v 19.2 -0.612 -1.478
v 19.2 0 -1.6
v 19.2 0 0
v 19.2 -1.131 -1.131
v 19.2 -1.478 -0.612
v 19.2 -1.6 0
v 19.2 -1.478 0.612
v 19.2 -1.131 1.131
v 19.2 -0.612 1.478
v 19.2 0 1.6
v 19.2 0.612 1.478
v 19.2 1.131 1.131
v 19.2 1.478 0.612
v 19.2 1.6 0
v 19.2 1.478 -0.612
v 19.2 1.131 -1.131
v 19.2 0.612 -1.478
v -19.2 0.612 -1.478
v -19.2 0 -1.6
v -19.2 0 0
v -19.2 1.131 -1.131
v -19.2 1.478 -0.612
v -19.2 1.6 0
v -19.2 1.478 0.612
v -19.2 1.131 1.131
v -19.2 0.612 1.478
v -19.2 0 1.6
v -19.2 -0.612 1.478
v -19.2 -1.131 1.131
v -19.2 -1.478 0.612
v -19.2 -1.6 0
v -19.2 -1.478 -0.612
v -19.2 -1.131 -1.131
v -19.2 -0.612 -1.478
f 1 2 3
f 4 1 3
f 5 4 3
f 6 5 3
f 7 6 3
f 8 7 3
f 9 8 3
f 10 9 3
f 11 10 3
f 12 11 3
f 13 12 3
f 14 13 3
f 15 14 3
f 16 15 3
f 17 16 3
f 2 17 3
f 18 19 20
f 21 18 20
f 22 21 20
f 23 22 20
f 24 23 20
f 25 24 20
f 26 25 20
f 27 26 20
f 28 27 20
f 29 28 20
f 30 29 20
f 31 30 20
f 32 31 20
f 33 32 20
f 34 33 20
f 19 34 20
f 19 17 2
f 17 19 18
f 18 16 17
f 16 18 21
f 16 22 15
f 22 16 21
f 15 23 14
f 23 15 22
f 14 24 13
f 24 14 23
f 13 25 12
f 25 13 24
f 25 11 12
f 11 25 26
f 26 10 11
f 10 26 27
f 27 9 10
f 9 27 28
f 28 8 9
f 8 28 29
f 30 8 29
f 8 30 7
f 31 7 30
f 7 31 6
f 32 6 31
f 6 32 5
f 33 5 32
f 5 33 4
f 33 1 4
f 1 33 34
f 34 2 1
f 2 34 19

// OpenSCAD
// file: ../p/4-4edge.scad
use <../lib.scad>
function ldraw_lib__4_4edge() = [
// 0 Circle 1.0
// 0 Name: 4-4edge.dat
// 0 Author: James Jessiman
// 0 !LDRAW_ORG Primitive UPDATE 2017-01
// 0 !LICENSE Licensed under CC BY 2.0 and CC BY 4.0 : see CAreadme.txt
// 
// 0 BFC CERTIFY CCW
  [0,"BFC","CERTIFY"],
  [0,"BFC","CCW"],
// 
// 0 !HISTORY 1998-12-15 [PTadmin] Official Update 1998-10
// 0 !HISTORY 2005-12-28 [PTadmin] Official Update 2005-01
// 0 !HISTORY 2007-06-24 [PTadmin] Header formatted for Contributor Agreement
// 0 !HISTORY 2008-07-01 [PTadmin] Official Update 2008-01
// 0 !HISTORY 2017-01-15 [Steffen] BFCed
// 0 !HISTORY 2017-12-30 [PTadmin] Official Update 2017-01
// 
// 
// 2 24 1 0 0 0.9239 0 0.3827
  [2,24,1,0,0,0.9239,0,0.3827],
// 2 24 0.9239 0 0.3827 0.7071 0 0.7071
  [2,24,0.9239,0,0.3827,0.7071,0,0.7071],
// 2 24 0.7071 0 0.7071 0.3827 0 0.9239
  [2,24,0.7071,0,0.7071,0.3827,0,0.9239],
// 2 24 0.3827 0 0.9239 0 0 1
  [2,24,0.3827,0,0.9239,0,0,1],
// 2 24 0 0 1 -0.3827 0 0.9239
  [2,24,0,0,1,-0.3827,0,0.9239],
// 2 24 -0.3827 0 0.9239 -0.7071 0 0.7071
  [2,24,-0.3827,0,0.9239,-0.7071,0,0.7071],
// 2 24 -0.7071 0 0.7071 -0.9239 0 0.3827
  [2,24,-0.7071,0,0.7071,-0.9239,0,0.3827],
// 2 24 -0.9239 0 0.3827 -1 0 -0
  [2,24,-0.9239,0,0.3827,-1,0,-0],
// 2 24 -1 0 -0 -0.9239 0 -0.3827
  [2,24,-1,0,-0,-0.9239,0,-0.3827],
// 2 24 -0.9239 0 -0.3827 -0.7071 0 -0.7071
  [2,24,-0.9239,0,-0.3827,-0.7071,0,-0.7071],
// 2 24 -0.7071 0 -0.7071 -0.3827 0 -0.9239
  [2,24,-0.7071,0,-0.7071,-0.3827,0,-0.9239],
// 2 24 -0.3827 0 -0.9239 0 0 -1
  [2,24,-0.3827,0,-0.9239,0,0,-1],
// 2 24 0 0 -1 0.3827 0 -0.9239
  [2,24,0,0,-1,0.3827,0,-0.9239],
// 2 24 0.3827 0 -0.9239 0.7071 0 -0.7071
  [2,24,0.3827,0,-0.9239,0.7071,0,-0.7071],
// 2 24 0.7071 0 -0.7071 0.9239 0 -0.3827
  [2,24,0.7071,0,-0.7071,0.9239,0,-0.3827],
// 2 24 0.9239 0 -0.3827 1 0 0
  [2,24,0.9239,0,-0.3827,1,0,0],
];
module ldraw_lib__4_4edge(step=0, col=false, unit=2/5, alt=false, line=0.2, solid=!$preview)
    makepoly(ldraw_lib__4_4edge(), step=step, col=col, unit=unit, alt=alt, line=line, solid=solid);
ldraw_lib__4_4edge(line=0.2);
// file: ../p/4-4cyli.scad
use <../lib.scad>
function ldraw_lib__4_4cyli() = [
// 0 Cylinder 1.0
// 0 Name: 4-4cyli.dat
// 0 Author: James Jessiman
// 0 !LDRAW_ORG Primitive UPDATE 2005-01
// 0 !LICENSE Licensed under CC BY 2.0 and CC BY 4.0 : see CAreadme.txt
// 
// 0 BFC CERTIFY CCW
  [0,"BFC","CERTIFY"],
  [0,"BFC","CCW"],
// 
// 0 !HISTORY 1998-12-15 [PTadmin] Official Update 1998-10
// 0 !HISTORY 2002-03-23 [sbliss] Added BFC statement; merged headers from files in distributions LDraw 0.27 and Complete.
// 0 !HISTORY 2002-04-25 [PTadmin] Official Update 2002-02
// 0 !HISTORY 2004-12-14 [guyvivan] BFC CCW
// 0 !HISTORY 2005-12-28 [PTadmin] Official Update 2005-01
// 0 !HISTORY 2007-06-24 [PTadmin] Header formatted for Contributor Agreement
// 0 !HISTORY 2008-07-01 [PTadmin] Official Update 2008-01
// 
// 
// 4 16 1 1 0 0.9239 1 0.3827 0.9239 0 0.3827 1 0 0
  [4,16,1,1,0,0.9239,1,0.3827,0.9239,0,0.3827,1,0,0],
// 5 24 1 0 0 1 1 0 0.9239 0 0.3827 0.9239 0 -0.3827
  [5,24,1,0,0,1,1,0,0.9239,0,0.3827,0.9239,0,-0.3827],
// 4 16 0.9239 1 0.3827 0.7071 1 0.7071 0.7071 0 0.7071 0.9239 0 0.3827
  [4,16,0.9239,1,0.3827,0.7071,1,0.7071,0.7071,0,0.7071,0.9239,0,0.3827],
// 5 24 0.9239 0 0.3827 0.9239 1 0.3827 0.7071 0 0.7071 1 0 0
  [5,24,0.9239,0,0.3827,0.9239,1,0.3827,0.7071,0,0.7071,1,0,0],
// 4 16 0.7071 1 0.7071 0.3827 1 0.9239 0.3827 0 0.9239 0.7071 0 0.7071
  [4,16,0.7071,1,0.7071,0.3827,1,0.9239,0.3827,0,0.9239,0.7071,0,0.7071],
// 5 24 0.7071 0 0.7071 0.7071 1 0.7071 0.3827 0 0.9239 0.9239 0 0.3827
  [5,24,0.7071,0,0.7071,0.7071,1,0.7071,0.3827,0,0.9239,0.9239,0,0.3827],
// 4 16 0.3827 1 0.9239 0 1 1 0 0 1 0.3827 0 0.9239
  [4,16,0.3827,1,0.9239,0,1,1,0,0,1,0.3827,0,0.9239],
// 5 24 0.3827 0 0.9239 0.3827 1 0.9239 0 0 1 0.7071 0 0.7071
  [5,24,0.3827,0,0.9239,0.3827,1,0.9239,0,0,1,0.7071,0,0.7071],
// 4 16 0 1 1 -0.3827 1 0.9239 -0.3827 0 0.9239 0 0 1
  [4,16,0,1,1,-0.3827,1,0.9239,-0.3827,0,0.9239,0,0,1],
// 5 24 0 0 1 0 1 1 -0.3827 0 0.9239 0.3827 0 0.9239
  [5,24,0,0,1,0,1,1,-0.3827,0,0.9239,0.3827,0,0.9239],
// 4 16 -0.3827 1 0.9239 -0.7071 1 0.7071 -0.7071 0 0.7071 -0.3827 0 0.9239
  [4,16,-0.3827,1,0.9239,-0.7071,1,0.7071,-0.7071,0,0.7071,-0.3827,0,0.9239],
// 5 24 -0.3827 0 0.9239 -0.3827 1 0.9239 -0.7071 0 0.7071 0 0 1
  [5,24,-0.3827,0,0.9239,-0.3827,1,0.9239,-0.7071,0,0.7071,0,0,1],
// 4 16 -0.7071 1 0.7071 -0.9239 1 0.3827 -0.9239 0 0.3827 -0.7071 0 0.7071
  [4,16,-0.7071,1,0.7071,-0.9239,1,0.3827,-0.9239,0,0.3827,-0.7071,0,0.7071],
// 5 24 -0.7071 0 0.7071 -0.7071 1 0.7071 -0.9239 0 0.3827 -0.3827 0 0.9239
  [5,24,-0.7071,0,0.7071,-0.7071,1,0.7071,-0.9239,0,0.3827,-0.3827,0,0.9239],
// 4 16 -0.9239 1 0.3827 -1 1 0 -1 0 0 -0.9239 0 0.3827
  [4,16,-0.9239,1,0.3827,-1,1,0,-1,0,0,-0.9239,0,0.3827],
// 5 24 -0.9239 0 0.3827 -0.9239 1 0.3827 -1 0 0 -0.7071 0 0.7071
  [5,24,-0.9239,0,0.3827,-0.9239,1,0.3827,-1,0,0,-0.7071,0,0.7071],
// 4 16 -1 1 0 -0.9239 1 -0.3827 -0.9239 0 -0.3827 -1 0 0
  [4,16,-1,1,0,-0.9239,1,-0.3827,-0.9239,0,-0.3827,-1,0,0],
// 5 24 -1 0 0 -1 1 0 -0.9239 0 -0.3827 -0.9239 0 0.3827
  [5,24,-1,0,0,-1,1,0,-0.9239,0,-0.3827,-0.9239,0,0.3827],
// 4 16 -0.9239 1 -0.3827 -0.7071 1 -0.7071 -0.7071 0 -0.7071 -0.9239 0 -0.3827
  [4,16,-0.9239,1,-0.3827,-0.7071,1,-0.7071,-0.7071,0,-0.7071,-0.9239,0,-0.3827],
// 5 24 -0.9239 0 -0.3827 -0.9239 1 -0.3827 -0.7071 0 -0.7071 -1 0 0
  [5,24,-0.9239,0,-0.3827,-0.9239,1,-0.3827,-0.7071,0,-0.7071,-1,0,0],
// 4 16 -0.7071 1 -0.7071 -0.3827 1 -0.9239 -0.3827 0 -0.9239 -0.7071 0 -0.7071
  [4,16,-0.7071,1,-0.7071,-0.3827,1,-0.9239,-0.3827,0,-0.9239,-0.7071,0,-0.7071],
// 5 24 -0.7071 0 -0.7071 -0.7071 1 -0.7071 -0.3827 0 -0.9239 -0.9239 0 -0.3827
  [5,24,-0.7071,0,-0.7071,-0.7071,1,-0.7071,-0.3827,0,-0.9239,-0.9239,0,-0.3827],
// 4 16 -0.3827 1 -0.9239 0 1 -1 0 0 -1 -0.3827 0 -0.9239
  [4,16,-0.3827,1,-0.9239,0,1,-1,0,0,-1,-0.3827,0,-0.9239],
// 5 24 -0.3827 0 -0.9239 -0.3827 1 -0.9239 0 0 -1 -0.7071 0 -0.7071
  [5,24,-0.3827,0,-0.9239,-0.3827,1,-0.9239,0,0,-1,-0.7071,0,-0.7071],
// 4 16 0 1 -1 0.3827 1 -0.9239 0.3827 0 -0.9239 0 0 -1
  [4,16,0,1,-1,0.3827,1,-0.9239,0.3827,0,-0.9239,0,0,-1],
// 5 24 0 0 -1 0 1 -1 0.3827 0 -0.9239 -0.3827 0 -0.9239
  [5,24,0,0,-1,0,1,-1,0.3827,0,-0.9239,-0.3827,0,-0.9239],
// 4 16 0.3827 1 -0.9239 0.7071 1 -0.7071 0.7071 0 -0.7071 0.3827 0 -0.9239
  [4,16,0.3827,1,-0.9239,0.7071,1,-0.7071,0.7071,0,-0.7071,0.3827,0,-0.9239],
// 5 24 0.3827 0 -0.9239 0.3827 1 -0.9239 0.7071 0 -0.7071 0 0 -1
  [5,24,0.3827,0,-0.9239,0.3827,1,-0.9239,0.7071,0,-0.7071,0,0,-1],
// 4 16 0.7071 1 -0.7071 0.9239 1 -0.3827 0.9239 0 -0.3827 0.7071 0 -0.7071
  [4,16,0.7071,1,-0.7071,0.9239,1,-0.3827,0.9239,0,-0.3827,0.7071,0,-0.7071],
// 5 24 0.7071 0 -0.7071 0.7071 1 -0.7071 0.9239 0 -0.3827 0.3827 0 -0.9239
  [5,24,0.7071,0,-0.7071,0.7071,1,-0.7071,0.9239,0,-0.3827,0.3827,0,-0.9239],
// 4 16 0.9239 1 -0.3827 1 1 0 1 0 0 0.9239 0 -0.3827
  [4,16,0.9239,1,-0.3827,1,1,0,1,0,0,0.9239,0,-0.3827],
// 5 24 0.9239 0 -0.3827 0.9239 1 -0.3827 1 0 0 0.7071 0 -0.7071
  [5,24,0.9239,0,-0.3827,0.9239,1,-0.3827,1,0,0,0.7071,0,-0.7071],
// 0
];
module ldraw_lib__4_4cyli(step=0, col=false, unit=2/5, alt=false, line=0.2, solid=!$preview)
    makepoly(ldraw_lib__4_4cyli(), step=step, col=col, unit=unit, alt=alt, line=line, solid=solid);
ldraw_lib__4_4cyli(line=0.2);
// file: ../p/4-4disc.scad
use <../lib.scad>
function ldraw_lib__4_4disc() = [
// 0 Disc 1.0
// 0 Name: 4-4disc.dat
// 0 Author: James Jessiman
// 0 !LDRAW_ORG Primitive UPDATE 2002-02
// 0 !LICENSE Licensed under CC BY 2.0 and CC BY 4.0 : see CAreadme.txt
// 
// 0 BFC CERTIFY CCW
  [0,"BFC","CERTIFY"],
  [0,"BFC","CCW"],
// 
// 0 !HISTORY 1998-12-15 [PTadmin] Official Update 1998-10
// 0 !HISTORY 2002-03-23 [sbliss] Added BFC statement
// 0 !HISTORY 2002-04-25 [PTadmin] Official Update 2002-02
// 0 !HISTORY 2007-06-24 [PTadmin] Header formatted for Contributor Agreement
// 0 !HISTORY 2008-07-01 [PTadmin] Official Update 2008-01
// 
// 
// 3 16 0 0 0 1 0 0 0.9239 0 0.3827
  [3,16,0,0,0,1,0,0,0.9239,0,0.3827],
// 3 16 0 0 0 0.9239 0 0.3827 0.7071 0 0.7071
  [3,16,0,0,0,0.9239,0,0.3827,0.7071,0,0.7071],
// 3 16 0 0 0 0.7071 0 0.7071 0.3827 0 0.9239
  [3,16,0,0,0,0.7071,0,0.7071,0.3827,0,0.9239],
// 3 16 0 0 0 0.3827 0 0.9239 0 0 1
  [3,16,0,0,0,0.3827,0,0.9239,0,0,1],
// 3 16 0 0 0 0 0 1 -0.3827 0 0.9239
  [3,16,0,0,0,0,0,1,-0.3827,0,0.9239],
// 3 16 0 0 0 -0.3827 0 0.9239 -0.7071 0 0.7071
  [3,16,0,0,0,-0.3827,0,0.9239,-0.7071,0,0.7071],
// 3 16 0 0 0 -0.7071 0 0.7071 -0.9239 0 0.3827
  [3,16,0,0,0,-0.7071,0,0.7071,-0.9239,0,0.3827],
// 3 16 0 0 0 -0.9239 0 0.3827 -1 0 -0
  [3,16,0,0,0,-0.9239,0,0.3827,-1,0,-0],
// 3 16 0 0 0 -1 0 -0 -0.9239 0 -0.3827
  [3,16,0,0,0,-1,0,-0,-0.9239,0,-0.3827],
// 3 16 0 0 0 -0.9239 0 -0.3827 -0.7071 0 -0.7071
  [3,16,0,0,0,-0.9239,0,-0.3827,-0.7071,0,-0.7071],
// 3 16 0 0 0 -0.7071 0 -0.7071 -0.3827 0 -0.9239
  [3,16,0,0,0,-0.7071,0,-0.7071,-0.3827,0,-0.9239],
// 3 16 0 0 0 -0.3827 0 -0.9239 0 0 -1
  [3,16,0,0,0,-0.3827,0,-0.9239,0,0,-1],
// 3 16 0 0 0 0 0 -1 0.3827 0 -0.9239
  [3,16,0,0,0,0,0,-1,0.3827,0,-0.9239],
// 3 16 0 0 0 0.3827 0 -0.9239 0.7071 0 -0.7071
  [3,16,0,0,0,0.3827,0,-0.9239,0.7071,0,-0.7071],
// 3 16 0 0 0 0.7071 0 -0.7071 0.9239 0 -0.3827
  [3,16,0,0,0,0.7071,0,-0.7071,0.9239,0,-0.3827],
// 3 16 0 0 0 0.9239 0 -0.3827 1 0 0
  [3,16,0,0,0,0.9239,0,-0.3827,1,0,0],
// 0
];
module ldraw_lib__4_4disc(step=0, col=false, unit=2/5, alt=false, line=0.2, solid=!$preview)
    makepoly(ldraw_lib__4_4disc(), step=step, col=col, unit=unit, alt=alt, line=line, solid=solid);
ldraw_lib__4_4disc(line=0.2);
// file: ../p/4-4cylc.scad
use <../lib.scad>
use <4-4cyli.scad>
use <4-4disc.scad>
use <4-4edge.scad>
function ldraw_lib__4_4cylc() = [
// 0 Cylinder Closed 1.0
// 0 Name: 4-4cylc.dat
// 0 Author: Alex Taylor [anathema]
// 0 !LDRAW_ORG Primitive UPDATE 2009-02
// 0 !LICENSE Licensed under CC BY 2.0 and CC BY 4.0 : see CAreadme.txt
// 
// 0 BFC CERTIFY CCW
  [0,"BFC","CERTIFY"],
  [0,"BFC","CCW"],
// 
// 0 !HISTORY 2008-12-29 [cwdee] Removed one disc
// 0 !HISTORY 2009-09-03 [PTadmin] Official Update 2009-02
// 
// 
// 1 16 0 0 0 1 0 0 0 1 0 0 0 1 4-4edge.dat
  [1,16,0,0,0,1,0,0,0,1,0,0,0,1, ldraw_lib__4_4edge()],
// 1 16 0 1 0 1 0 0 0 1 0 0 0 1 4-4edge.dat
  [1,16,0,1,0,1,0,0,0,1,0,0,0,1, ldraw_lib__4_4edge()],
// 1 16 0 0 0 1 0 0 0 1 0 0 0 1 4-4disc.dat
  [1,16,0,0,0,1,0,0,0,1,0,0,0,1, ldraw_lib__4_4disc()],
// 1 16 0 0 0 1 0 0 0 1 0 0 0 1 4-4cyli.dat
  [1,16,0,0,0,1,0,0,0,1,0,0,0,1, ldraw_lib__4_4cyli()],
// 0
];
module ldraw_lib__4_4cylc(step=0, col=false, unit=2/5, alt=false, line=0.2, solid=!$preview)
    makepoly(ldraw_lib__4_4cylc(), step=step, col=col, unit=unit, alt=alt, line=line, solid=solid);
ldraw_lib__4_4cylc(line=0.2);
// main file
use <../lib.scad>
use <../p/4-4cylc.scad>
use <../p/4-4disc.scad>
function ldraw_lib__u9183() = [
// 0 ~Axle Steel  4 x 96 LDU
// 0 Name: u9183.dat
// 0 Author: Magnus Forsberg [MagFors]
// 0 !LDRAW_ORG Part UPDATE 2011-02
// 0 !LICENSE Licensed under CC BY 2.0 and CC BY 4.0 : see CAreadme.txt
// 
// 0 BFC CERTIFY CCW
  [0,"BFC","CERTIFY"],
  [0,"BFC","CCW"],
// 
// 0 !CATEGORY Wheel
// 
// 0 !HISTORY 2011-12-29 [PTadmin] Official Update 2011-02
// 
// 
// 1 16 48 0 0 0 -1 0 4 0 0 0 0 -4 4-4disc.dat
  [1,16,48,0,0,0,-1,0,4,0,0,0,0,-4, ldraw_lib__4_4disc()],
// 1 16 -48 0 0 0 96 0 4 0 0 0 0 4 4-4cylc.dat
  [1,16,-48,0,0,0,96,0,4,0,0,0,0,4, ldraw_lib__4_4cylc()],
];
module ldraw_lib__u9183(step=0, col=false, unit=2/5, alt=false, line=0.2, solid=!$preview)
    makepoly(ldraw_lib__u9183(), step=step, col=col, unit=unit, alt=alt, line=line, solid=solid);
ldraw_lib__u9183(line=0.2);
